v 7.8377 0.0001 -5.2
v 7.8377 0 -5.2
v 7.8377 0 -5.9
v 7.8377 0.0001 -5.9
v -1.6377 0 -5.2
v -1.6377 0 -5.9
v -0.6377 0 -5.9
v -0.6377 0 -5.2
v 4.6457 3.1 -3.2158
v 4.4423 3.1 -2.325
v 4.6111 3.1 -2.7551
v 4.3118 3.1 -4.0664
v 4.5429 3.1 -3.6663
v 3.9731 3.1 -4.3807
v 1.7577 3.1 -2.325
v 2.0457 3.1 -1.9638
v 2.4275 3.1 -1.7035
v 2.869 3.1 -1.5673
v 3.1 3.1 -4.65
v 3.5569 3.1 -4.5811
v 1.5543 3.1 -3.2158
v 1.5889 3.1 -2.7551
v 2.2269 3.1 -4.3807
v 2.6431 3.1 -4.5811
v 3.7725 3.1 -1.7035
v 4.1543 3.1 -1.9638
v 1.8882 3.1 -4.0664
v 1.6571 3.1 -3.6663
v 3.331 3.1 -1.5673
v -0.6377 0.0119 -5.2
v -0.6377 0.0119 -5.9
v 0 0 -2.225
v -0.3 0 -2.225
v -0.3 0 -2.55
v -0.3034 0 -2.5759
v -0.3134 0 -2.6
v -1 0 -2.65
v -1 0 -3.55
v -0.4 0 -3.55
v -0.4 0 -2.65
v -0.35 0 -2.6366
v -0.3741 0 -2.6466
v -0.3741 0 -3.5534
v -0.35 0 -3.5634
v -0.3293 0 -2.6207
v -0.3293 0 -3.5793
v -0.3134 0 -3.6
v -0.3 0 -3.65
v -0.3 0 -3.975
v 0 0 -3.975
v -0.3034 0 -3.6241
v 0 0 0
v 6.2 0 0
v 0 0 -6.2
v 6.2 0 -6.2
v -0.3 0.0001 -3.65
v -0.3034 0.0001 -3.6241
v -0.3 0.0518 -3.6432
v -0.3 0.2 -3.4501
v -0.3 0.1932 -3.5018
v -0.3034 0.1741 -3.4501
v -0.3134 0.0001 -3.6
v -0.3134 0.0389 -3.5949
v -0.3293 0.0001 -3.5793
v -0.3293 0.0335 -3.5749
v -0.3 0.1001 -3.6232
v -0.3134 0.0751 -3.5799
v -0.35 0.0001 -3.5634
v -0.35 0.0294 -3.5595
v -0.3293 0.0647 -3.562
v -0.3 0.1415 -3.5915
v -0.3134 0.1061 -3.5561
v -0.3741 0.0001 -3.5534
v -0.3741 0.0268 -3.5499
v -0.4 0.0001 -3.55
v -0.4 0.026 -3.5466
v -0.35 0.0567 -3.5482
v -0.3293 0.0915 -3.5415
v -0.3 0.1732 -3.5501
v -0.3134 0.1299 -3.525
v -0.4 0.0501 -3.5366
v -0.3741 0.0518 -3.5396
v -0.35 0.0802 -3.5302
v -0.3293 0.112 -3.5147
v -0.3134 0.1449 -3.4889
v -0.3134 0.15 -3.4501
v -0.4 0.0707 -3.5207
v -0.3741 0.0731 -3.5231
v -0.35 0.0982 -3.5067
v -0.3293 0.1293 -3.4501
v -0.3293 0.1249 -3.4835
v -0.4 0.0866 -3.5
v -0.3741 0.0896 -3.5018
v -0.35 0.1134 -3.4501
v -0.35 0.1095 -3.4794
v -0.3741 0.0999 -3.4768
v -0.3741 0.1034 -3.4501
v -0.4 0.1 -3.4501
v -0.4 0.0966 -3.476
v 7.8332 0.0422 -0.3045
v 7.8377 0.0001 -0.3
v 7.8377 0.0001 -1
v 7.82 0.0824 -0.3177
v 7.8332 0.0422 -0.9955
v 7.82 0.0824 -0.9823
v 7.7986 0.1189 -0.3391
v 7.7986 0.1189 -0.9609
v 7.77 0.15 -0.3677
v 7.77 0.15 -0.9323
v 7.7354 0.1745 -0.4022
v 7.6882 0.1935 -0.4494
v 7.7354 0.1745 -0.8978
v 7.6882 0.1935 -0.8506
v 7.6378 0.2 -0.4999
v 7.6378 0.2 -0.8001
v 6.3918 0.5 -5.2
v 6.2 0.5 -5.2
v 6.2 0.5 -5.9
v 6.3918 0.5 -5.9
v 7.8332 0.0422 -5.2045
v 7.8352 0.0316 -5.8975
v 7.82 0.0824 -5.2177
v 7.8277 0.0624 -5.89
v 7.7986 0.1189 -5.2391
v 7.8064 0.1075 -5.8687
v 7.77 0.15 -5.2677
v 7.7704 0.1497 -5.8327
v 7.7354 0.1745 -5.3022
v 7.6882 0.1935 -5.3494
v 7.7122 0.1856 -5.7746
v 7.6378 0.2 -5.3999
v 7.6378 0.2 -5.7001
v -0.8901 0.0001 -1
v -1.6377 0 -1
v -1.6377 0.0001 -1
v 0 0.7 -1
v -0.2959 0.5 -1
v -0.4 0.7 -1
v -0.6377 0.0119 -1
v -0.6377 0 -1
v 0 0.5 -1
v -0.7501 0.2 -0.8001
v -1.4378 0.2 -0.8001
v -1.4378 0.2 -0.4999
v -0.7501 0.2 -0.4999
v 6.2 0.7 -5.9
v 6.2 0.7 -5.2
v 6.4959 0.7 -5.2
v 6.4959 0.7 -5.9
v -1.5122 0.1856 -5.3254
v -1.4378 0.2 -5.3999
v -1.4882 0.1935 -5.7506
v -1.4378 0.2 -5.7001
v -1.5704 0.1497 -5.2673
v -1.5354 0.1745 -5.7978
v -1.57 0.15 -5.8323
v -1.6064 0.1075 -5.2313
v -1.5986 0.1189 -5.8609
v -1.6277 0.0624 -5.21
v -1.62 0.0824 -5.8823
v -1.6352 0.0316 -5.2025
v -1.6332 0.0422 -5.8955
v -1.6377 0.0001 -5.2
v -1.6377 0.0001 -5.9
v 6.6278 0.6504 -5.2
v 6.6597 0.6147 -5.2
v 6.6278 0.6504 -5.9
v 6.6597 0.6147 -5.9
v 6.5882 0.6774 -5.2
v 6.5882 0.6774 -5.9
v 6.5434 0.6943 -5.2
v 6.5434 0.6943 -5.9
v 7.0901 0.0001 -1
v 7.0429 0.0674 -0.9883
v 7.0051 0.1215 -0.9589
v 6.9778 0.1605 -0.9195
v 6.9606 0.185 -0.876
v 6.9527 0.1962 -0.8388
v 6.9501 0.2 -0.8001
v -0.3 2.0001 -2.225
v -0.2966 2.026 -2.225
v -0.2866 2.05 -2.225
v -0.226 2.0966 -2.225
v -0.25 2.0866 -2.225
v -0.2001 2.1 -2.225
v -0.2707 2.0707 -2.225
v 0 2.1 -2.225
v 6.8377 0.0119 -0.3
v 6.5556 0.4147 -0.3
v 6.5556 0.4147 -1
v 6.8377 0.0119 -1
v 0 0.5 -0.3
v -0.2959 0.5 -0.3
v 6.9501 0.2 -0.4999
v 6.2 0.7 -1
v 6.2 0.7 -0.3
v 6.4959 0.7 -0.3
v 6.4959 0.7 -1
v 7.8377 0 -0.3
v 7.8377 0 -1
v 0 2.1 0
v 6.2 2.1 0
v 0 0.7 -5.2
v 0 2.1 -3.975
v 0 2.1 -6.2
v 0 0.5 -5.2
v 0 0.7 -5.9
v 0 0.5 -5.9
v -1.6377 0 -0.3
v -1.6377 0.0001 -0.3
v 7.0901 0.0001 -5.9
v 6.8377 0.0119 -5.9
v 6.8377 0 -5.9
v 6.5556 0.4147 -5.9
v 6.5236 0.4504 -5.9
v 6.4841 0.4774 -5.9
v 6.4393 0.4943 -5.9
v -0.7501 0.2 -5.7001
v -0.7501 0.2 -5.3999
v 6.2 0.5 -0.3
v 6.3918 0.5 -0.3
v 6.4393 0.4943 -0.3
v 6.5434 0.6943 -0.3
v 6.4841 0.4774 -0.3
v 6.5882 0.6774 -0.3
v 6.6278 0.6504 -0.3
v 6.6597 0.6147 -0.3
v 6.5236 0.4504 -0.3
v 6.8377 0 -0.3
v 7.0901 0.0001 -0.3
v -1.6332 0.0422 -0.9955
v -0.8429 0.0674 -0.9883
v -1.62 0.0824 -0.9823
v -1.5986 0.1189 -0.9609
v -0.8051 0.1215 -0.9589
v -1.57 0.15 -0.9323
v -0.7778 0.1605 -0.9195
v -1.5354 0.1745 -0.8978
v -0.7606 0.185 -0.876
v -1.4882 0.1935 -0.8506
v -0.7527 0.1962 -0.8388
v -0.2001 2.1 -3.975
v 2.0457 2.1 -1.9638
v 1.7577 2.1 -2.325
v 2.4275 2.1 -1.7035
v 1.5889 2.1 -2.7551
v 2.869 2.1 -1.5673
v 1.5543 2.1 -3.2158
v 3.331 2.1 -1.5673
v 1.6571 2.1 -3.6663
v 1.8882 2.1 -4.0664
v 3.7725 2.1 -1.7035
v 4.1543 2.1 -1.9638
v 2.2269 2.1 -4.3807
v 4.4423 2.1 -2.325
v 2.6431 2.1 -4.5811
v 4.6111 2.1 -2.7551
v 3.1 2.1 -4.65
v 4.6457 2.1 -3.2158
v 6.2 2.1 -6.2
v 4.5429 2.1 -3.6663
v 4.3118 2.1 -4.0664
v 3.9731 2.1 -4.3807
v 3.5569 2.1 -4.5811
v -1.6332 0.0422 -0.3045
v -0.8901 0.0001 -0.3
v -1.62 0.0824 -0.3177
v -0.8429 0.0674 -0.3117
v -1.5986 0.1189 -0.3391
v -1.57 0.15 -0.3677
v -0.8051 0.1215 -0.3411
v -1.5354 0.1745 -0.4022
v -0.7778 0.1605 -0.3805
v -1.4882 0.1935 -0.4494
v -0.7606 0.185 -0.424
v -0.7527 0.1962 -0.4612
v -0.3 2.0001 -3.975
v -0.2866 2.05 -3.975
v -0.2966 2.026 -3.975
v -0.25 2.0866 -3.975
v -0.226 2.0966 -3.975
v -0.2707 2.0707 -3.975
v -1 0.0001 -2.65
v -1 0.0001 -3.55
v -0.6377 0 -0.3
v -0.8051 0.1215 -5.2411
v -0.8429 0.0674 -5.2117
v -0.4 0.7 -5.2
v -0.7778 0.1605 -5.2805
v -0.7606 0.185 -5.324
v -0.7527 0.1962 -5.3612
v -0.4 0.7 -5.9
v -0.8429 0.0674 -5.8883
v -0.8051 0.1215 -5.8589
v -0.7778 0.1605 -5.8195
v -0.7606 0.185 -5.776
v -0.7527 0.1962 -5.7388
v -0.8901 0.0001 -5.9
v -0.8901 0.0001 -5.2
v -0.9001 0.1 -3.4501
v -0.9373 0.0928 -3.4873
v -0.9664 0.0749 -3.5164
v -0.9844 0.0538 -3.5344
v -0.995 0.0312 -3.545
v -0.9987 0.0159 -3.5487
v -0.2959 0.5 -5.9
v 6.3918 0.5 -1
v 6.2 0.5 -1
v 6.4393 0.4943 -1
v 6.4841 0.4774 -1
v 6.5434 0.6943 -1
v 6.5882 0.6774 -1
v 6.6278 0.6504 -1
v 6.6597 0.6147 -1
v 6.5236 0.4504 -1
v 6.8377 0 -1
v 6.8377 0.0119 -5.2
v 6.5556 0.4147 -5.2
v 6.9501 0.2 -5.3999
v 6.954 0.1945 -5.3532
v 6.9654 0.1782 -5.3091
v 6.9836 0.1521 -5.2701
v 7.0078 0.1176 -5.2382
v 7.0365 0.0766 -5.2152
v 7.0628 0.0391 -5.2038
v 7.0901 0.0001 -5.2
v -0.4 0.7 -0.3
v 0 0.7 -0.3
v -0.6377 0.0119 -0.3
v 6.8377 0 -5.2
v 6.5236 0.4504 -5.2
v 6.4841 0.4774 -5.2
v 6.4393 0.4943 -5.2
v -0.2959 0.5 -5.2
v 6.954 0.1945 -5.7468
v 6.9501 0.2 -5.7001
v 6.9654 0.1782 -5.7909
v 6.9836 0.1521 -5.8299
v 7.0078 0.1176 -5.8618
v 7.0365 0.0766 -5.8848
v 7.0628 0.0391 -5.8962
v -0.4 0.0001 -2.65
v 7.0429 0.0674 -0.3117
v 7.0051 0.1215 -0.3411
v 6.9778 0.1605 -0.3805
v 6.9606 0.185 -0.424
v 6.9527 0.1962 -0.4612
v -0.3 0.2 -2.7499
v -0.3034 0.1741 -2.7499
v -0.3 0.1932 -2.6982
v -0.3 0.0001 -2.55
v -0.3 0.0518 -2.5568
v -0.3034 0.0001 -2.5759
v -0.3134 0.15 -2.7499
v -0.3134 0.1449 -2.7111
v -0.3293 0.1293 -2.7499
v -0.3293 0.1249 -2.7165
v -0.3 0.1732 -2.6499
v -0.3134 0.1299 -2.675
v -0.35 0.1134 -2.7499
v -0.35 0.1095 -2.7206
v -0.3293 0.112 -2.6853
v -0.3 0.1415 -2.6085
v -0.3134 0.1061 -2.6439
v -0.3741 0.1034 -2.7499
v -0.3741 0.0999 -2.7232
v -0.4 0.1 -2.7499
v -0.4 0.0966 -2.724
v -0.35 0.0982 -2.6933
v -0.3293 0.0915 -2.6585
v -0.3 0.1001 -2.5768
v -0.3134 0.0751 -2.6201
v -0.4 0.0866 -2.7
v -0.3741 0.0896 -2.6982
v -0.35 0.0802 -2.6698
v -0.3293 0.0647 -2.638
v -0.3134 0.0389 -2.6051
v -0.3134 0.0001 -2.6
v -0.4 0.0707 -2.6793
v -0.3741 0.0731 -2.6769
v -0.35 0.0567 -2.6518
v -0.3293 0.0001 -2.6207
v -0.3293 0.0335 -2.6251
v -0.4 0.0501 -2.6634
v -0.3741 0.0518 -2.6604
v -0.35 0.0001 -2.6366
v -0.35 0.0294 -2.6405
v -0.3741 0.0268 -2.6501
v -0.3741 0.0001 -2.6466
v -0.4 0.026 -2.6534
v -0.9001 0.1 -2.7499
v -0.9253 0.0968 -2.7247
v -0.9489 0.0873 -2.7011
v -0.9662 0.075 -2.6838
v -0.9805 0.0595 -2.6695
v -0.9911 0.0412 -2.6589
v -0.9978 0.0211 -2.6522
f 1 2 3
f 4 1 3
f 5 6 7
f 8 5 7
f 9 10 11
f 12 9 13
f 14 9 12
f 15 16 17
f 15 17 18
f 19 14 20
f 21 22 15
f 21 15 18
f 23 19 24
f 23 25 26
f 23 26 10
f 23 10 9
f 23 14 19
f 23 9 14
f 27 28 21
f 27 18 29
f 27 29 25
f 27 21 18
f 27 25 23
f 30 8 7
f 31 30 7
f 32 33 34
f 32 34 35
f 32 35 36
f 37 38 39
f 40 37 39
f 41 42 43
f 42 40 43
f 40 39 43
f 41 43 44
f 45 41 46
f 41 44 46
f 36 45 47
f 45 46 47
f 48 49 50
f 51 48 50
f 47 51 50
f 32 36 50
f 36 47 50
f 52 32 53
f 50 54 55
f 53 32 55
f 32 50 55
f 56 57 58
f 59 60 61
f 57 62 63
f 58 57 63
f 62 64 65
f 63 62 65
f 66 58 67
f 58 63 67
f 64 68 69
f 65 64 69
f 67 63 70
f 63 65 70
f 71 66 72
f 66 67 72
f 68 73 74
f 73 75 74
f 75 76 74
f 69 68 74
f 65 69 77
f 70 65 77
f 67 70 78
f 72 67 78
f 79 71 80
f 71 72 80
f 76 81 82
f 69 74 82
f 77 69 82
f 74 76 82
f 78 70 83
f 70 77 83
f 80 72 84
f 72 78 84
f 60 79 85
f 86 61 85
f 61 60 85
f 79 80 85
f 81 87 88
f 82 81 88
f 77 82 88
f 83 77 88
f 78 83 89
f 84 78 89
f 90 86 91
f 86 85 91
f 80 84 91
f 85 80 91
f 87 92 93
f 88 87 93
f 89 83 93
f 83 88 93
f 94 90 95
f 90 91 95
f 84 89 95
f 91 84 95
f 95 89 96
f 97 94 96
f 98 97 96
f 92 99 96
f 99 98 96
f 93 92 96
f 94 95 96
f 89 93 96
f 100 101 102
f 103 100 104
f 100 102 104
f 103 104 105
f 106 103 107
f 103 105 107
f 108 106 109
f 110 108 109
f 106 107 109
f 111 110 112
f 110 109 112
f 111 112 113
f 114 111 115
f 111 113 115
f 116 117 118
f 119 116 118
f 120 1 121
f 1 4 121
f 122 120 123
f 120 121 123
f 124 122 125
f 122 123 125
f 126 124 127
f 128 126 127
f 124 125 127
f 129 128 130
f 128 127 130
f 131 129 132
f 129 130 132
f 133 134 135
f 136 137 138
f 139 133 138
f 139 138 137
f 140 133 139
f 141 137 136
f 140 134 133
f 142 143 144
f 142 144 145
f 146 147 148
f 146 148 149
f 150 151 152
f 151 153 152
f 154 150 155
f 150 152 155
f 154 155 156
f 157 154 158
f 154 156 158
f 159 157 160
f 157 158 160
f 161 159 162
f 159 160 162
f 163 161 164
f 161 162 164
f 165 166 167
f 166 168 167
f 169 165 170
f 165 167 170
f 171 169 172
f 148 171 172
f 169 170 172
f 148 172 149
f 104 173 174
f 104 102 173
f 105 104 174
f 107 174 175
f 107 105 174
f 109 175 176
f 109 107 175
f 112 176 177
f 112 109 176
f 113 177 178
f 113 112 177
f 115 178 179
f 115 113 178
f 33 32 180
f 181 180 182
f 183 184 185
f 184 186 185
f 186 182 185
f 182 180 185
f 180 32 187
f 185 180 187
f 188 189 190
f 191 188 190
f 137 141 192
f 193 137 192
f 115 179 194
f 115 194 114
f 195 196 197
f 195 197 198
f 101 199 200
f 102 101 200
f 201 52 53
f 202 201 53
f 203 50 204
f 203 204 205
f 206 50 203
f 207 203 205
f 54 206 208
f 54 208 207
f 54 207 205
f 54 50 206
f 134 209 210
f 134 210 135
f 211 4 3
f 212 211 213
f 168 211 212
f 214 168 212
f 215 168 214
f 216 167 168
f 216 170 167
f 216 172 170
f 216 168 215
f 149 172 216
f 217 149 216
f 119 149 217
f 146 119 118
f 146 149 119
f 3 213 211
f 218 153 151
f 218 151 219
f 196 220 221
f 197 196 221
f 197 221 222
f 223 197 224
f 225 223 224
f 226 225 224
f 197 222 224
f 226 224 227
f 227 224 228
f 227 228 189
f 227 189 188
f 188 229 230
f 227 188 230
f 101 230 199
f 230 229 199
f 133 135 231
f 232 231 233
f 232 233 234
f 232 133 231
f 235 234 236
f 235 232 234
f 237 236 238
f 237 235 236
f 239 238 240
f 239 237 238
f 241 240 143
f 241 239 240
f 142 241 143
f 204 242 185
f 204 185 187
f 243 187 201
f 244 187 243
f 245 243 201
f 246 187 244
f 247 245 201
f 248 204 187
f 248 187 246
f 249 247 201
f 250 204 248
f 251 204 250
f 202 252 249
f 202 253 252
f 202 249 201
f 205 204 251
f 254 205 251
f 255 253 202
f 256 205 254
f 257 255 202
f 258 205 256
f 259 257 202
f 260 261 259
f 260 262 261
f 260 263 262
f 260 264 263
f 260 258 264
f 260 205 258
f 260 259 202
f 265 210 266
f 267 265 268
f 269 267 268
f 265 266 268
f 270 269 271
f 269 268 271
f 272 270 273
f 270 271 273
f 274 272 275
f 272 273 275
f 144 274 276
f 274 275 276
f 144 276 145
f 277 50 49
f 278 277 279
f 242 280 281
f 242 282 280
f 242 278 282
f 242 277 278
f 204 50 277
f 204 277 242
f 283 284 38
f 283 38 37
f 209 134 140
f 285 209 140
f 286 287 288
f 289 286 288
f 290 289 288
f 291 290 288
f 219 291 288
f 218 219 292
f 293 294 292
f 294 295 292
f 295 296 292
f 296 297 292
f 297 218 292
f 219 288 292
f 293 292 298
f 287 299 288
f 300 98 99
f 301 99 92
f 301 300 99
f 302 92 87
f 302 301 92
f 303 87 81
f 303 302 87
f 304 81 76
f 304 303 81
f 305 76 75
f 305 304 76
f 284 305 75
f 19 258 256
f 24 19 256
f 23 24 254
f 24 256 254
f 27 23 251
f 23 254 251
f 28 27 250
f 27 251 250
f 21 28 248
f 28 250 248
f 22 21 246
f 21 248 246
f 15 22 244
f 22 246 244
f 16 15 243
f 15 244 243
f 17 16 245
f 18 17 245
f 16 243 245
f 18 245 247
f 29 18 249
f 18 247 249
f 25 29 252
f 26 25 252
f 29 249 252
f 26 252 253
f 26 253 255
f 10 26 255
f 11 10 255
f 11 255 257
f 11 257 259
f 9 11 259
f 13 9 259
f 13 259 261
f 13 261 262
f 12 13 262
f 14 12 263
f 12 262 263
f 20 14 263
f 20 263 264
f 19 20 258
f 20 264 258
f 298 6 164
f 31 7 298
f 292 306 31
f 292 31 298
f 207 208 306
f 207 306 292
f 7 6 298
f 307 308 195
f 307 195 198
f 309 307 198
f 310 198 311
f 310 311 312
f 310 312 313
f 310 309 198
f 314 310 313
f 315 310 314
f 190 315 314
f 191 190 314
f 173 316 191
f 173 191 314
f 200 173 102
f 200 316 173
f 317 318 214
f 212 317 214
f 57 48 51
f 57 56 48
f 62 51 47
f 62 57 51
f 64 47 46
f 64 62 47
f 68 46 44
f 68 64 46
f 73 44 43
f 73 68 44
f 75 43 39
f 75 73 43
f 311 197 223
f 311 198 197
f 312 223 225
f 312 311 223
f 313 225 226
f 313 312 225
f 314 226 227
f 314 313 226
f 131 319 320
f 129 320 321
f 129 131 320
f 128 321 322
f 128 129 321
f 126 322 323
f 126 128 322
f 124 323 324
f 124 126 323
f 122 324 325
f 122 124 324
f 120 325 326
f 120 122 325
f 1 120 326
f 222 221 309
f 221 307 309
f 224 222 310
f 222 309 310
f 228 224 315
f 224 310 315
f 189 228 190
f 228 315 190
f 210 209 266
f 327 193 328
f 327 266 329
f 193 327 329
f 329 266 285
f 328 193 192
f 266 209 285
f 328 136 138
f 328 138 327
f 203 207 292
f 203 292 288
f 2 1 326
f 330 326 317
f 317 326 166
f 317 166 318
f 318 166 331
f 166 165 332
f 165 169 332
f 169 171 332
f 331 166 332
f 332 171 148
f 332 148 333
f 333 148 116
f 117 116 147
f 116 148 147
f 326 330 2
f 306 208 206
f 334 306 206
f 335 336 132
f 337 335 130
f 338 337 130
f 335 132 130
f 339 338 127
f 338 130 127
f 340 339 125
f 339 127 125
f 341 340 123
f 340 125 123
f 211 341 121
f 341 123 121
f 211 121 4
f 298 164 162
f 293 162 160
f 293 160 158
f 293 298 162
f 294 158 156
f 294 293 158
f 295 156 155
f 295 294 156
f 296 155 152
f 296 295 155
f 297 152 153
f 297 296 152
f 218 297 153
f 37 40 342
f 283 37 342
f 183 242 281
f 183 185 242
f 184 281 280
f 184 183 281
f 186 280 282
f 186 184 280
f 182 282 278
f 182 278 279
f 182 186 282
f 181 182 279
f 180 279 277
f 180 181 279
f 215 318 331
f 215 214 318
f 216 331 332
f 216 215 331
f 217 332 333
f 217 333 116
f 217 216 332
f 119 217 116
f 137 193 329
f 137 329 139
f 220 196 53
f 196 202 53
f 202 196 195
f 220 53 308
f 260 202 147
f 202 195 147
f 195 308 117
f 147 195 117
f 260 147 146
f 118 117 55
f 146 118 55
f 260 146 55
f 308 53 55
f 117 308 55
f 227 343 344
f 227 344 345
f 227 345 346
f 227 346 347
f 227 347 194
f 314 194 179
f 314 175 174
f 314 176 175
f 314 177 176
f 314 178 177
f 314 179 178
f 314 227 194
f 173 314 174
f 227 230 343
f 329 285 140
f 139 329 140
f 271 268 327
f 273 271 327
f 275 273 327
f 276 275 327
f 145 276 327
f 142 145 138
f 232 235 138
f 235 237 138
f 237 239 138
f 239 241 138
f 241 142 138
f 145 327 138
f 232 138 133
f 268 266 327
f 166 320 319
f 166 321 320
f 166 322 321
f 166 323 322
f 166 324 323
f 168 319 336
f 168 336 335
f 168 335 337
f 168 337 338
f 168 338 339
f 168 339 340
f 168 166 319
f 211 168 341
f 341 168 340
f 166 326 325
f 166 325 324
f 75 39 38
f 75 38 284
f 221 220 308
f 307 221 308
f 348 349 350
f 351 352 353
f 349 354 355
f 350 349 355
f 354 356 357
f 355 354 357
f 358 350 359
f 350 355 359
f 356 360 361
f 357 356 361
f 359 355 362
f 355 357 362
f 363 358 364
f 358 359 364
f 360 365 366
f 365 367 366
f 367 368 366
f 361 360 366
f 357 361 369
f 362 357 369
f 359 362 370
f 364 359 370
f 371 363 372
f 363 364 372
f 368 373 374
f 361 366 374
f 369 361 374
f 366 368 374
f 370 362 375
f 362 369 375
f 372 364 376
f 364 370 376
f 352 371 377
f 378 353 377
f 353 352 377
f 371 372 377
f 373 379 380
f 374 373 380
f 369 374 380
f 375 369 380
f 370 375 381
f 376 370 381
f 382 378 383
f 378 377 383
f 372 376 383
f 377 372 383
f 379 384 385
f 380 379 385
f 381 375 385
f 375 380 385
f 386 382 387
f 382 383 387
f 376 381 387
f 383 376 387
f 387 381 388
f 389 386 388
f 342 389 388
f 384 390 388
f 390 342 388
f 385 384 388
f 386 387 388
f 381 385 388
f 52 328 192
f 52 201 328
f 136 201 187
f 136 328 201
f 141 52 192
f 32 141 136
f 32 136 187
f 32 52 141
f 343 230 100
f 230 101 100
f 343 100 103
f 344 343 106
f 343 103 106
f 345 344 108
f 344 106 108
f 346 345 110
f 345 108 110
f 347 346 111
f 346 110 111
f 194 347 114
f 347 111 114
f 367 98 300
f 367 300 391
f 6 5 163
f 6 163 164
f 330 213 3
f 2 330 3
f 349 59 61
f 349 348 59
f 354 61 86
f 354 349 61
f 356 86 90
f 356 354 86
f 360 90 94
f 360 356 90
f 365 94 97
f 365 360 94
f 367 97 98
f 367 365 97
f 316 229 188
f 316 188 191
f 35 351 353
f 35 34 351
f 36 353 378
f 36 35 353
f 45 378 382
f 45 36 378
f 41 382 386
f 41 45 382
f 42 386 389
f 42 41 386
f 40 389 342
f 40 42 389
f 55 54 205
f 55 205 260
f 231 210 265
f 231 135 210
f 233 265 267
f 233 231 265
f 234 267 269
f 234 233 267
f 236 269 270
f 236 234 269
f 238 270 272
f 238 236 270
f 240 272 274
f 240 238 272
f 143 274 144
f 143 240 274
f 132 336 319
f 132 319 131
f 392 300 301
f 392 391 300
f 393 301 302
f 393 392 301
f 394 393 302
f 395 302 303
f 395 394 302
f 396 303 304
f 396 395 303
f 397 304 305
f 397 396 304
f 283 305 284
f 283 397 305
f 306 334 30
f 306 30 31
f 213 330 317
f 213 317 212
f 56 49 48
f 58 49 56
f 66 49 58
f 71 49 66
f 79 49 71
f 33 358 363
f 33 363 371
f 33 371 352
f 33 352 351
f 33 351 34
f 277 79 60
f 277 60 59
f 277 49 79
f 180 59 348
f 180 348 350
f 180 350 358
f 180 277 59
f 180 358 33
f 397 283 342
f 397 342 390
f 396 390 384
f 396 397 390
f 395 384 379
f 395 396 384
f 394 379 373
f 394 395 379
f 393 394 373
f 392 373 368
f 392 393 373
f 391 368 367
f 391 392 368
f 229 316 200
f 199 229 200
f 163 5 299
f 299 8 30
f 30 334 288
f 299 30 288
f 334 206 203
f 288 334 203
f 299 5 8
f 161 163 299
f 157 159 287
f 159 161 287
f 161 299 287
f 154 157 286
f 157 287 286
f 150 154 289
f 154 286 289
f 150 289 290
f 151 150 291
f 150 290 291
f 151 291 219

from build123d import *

# Parameters (mm, degrees)
ESQUISSE1_W         = 6.2
ESQUISSE1_H         = 6.2
BOSS_EXTRU_1_DEPTH  = 2.1
ESQUISSE2_R         = 1.55
BOSS_EXTRU_2_DEPTH  = 1
ESQUISSE3_W         = 1.75
ESQUISSE3_H         = 2.1
BOSS_EXTRU_3_DEPTH  = 0.3
ESQUISSE4_W         = 0.9
ESQUISSE4_H         = 0.1
BOSS_EXTRU_4_DEPTH  = 0.7
CONG_1_R            = 0.1
ESQUISSE5_W         = 0.7
ESQUISSE5_H         = 0.2
BOSS_EXTRU_5_DEPTH  = 0.4
ESQUISSE7_W         = 0.7
ESQUISSE7_H         = 0.2
BOSS_EXTRU_6_DEPTH  = 0.7
CONG_2_R            = 0.2
ESQUISSE9_W         = 1
ESQUISSE9_H         = 0.7
BOSS_EXTRU_7_DEPTH  = 0.2
CONG_3_R            = 0.2
CONG_4_R            = 0.2
ESQUISSE10_W        = 0.7
ESQUISSE10_H        = 0.2
BOSS_EXTRU_10_DEPTH = 0.4
ESQUISSE14_W        = 0.7
ESQUISSE14_H        = 0.2
BOSS_EXTRU_11_DEPTH = 0.7
ESQUISSE16_W        = 1
ESQUISSE16_H        = 0.7
BOSS_EXTRU_12_DEPTH = 0.2
CONG_5_R            = 0.2


with BuildPart() as part:
    # Esquisse1 → Boss.-Extru.1 (new body)
    with BuildSketch(Plane(origin=(0, 0, 0), x_dir=(1, 0, 0), z_dir=(0, 1, 0))):
        with Locations((3.1, 3.1)):
            Rectangle(ESQUISSE1_W, ESQUISSE1_H)
    extrude(amount=BOSS_EXTRU_1_DEPTH)

    # Esquisse2 → Boss.-Extru.2 (add)
    with BuildSketch(Plane(origin=(0, 2.1, 0), x_dir=(1, 0, 0), z_dir=(0, 1, 0))):
        with Locations(Location((3.1, 3.1, 0), (0, 0, 90))):
            Circle(ESQUISSE2_R)
    extrude(amount=BOSS_EXTRU_2_DEPTH)

    # Esquisse3 → Boss.-Extru.3 (add)
    with BuildSketch(Plane.ZY):
        with Locations((-3.1, 1.05)):
            Rectangle(ESQUISSE3_W, ESQUISSE3_H)
    extrude(amount=BOSS_EXTRU_3_DEPTH)

    # Esquisse4 → Boss.-Extru.4 (add)
    with BuildSketch(Plane.ZY.offset(0.3)):
        with Locations((-3.1, 0.05)):
            Rectangle(ESQUISSE4_W, ESQUISSE4_H)
    extrude(amount=BOSS_EXTRU_4_DEPTH)

    # Congé1
    cong_1_edges = [part.edges().sort_by_distance(p)[0] for p in [
        (-0.65, 0.1, -3.55),
        (-0.65, 0.1, -2.65),
        (-1, 0.1, -3.1),
        (-0.3, 2.1, -3.1),
    ]]
    fillet(cong_1_edges, radius=CONG_1_R - 0.0001)  # a hair under: the kernel refuses the full size
    cong_1_2_edges = [part.edges().sort_by_distance(p)[0] for p in [
        (-0.3, 0.1, -3.1),
        (-0.3, 0.070739967, -3.520739967),
        (-0.3, 0.070739967, -2.679260033),
    ]]
    fillet(cong_1_2_edges, radius=CONG_1_R)

    # Esquisse5 → Boss.-Extru.5 (add)
    with BuildSketch(Plane(origin=(6.2, 0, 0), x_dir=(0, 0, -1), z_dir=(1, 0, 0))):
        with Locations((0.65, 0.6)):
            Rectangle(ESQUISSE5_W, ESQUISSE5_H)
        with Locations((5.55, 0.6)):
            Rectangle(ESQUISSE5_W, ESQUISSE5_H)
    extrude(amount=BOSS_EXTRU_5_DEPTH)

    # Esquisse7 → Boss.-Extru.6 (add)
    with BuildSketch(Plane(origin=(1.84244111, -2.631278598, 0), x_dir=(0, 0, -1), z_dir=(-0.5735764363510502, 0.8191520442889889, 0))):
        with Locations((5.55, -5.707906998)):
            Rectangle(ESQUISSE7_W, ESQUISSE7_H)
        with Locations((0.65, -5.707906998)):
            Rectangle(ESQUISSE7_W, ESQUISSE7_H)
    extrude(amount=-BOSS_EXTRU_6_DEPTH)

    # Congé2
    cong_2_edges = [part.edges().sort_by_distance(p)[0] for p in [
        (6.49588659, 0.5, -5.55),
        (6.49588659, 0.5, -0.65),
        (6.6, 0.7, -0.65),
        (6.6, 0.7, -5.55),
    ]]
    fillet(cong_2_edges, radius=CONG_2_R)

    # Esquisse9 → Boss.-Extru.7 (add)
    with BuildSketch(Plane(origin=(0, 0, 0), x_dir=(1, 0, 0), z_dir=(0, 1, 0))):
        with Locations((7.337673097, 0.65)):
            Rectangle(ESQUISSE9_W, ESQUISSE9_H)
        with Locations((7.337673097, 5.55)):
            Rectangle(ESQUISSE9_W, ESQUISSE9_H)
    extrude(amount=BOSS_EXTRU_7_DEPTH)

    # Congé3
    cong_3_edges = [part.edges().sort_by_distance(p)[0] for p in [
        (7.837673097, 0.2, -0.65),
        (7.393888433, 0.2, -1),
        (7.393888433, 0.2, -0.3),
    ]]
    fillet(cong_3_edges, radius=CONG_3_R - 0.0001)  # a hair under: the kernel refuses the full size

    # Congé4
    cong_4_edges = [part.edges().sort_by_distance(p)[0] for p in [
        (7.393888433, 0.2, -5.9),
        (7.837673097, 0.2, -5.55),
        (7.393888433, 0.2, -5.2),
    ]]
    fillet(cong_4_edges, radius=CONG_4_R - 0.0001)  # a hair under: the kernel refuses the full size

    # Esquisse10 → Boss.-Extru.10 (add)
    with BuildSketch(Plane.ZY):
        with Locations((-5.55, 0.6)):
            Rectangle(ESQUISSE10_W, ESQUISSE10_H)
        with Locations((-0.65, 0.6)):
            Rectangle(ESQUISSE10_W, ESQUISSE10_H)
    extrude(amount=BOSS_EXTRU_10_DEPTH)

    # Esquisse14 → Boss.-Extru.11 (add)
    with BuildSketch(Plane(origin=(0.197296446, 0.281768526, 0), x_dir=(0, 0, -1), z_dir=(-0.5735764363510527, -0.8191520442889871, 0))):
        with Locations((0.65, -0.629164323)):
            Rectangle(ESQUISSE14_W, ESQUISSE14_H)
        with Locations((5.55, -0.629164323)):
            Rectangle(ESQUISSE14_W, ESQUISSE14_H)
    extrude(amount=BOSS_EXTRU_11_DEPTH)

    # Esquisse16 → Boss.-Extru.12 (add)
    with BuildSketch(Plane(origin=(0, 0, 0), x_dir=(1, 0, 0), z_dir=(0, 1, 0))):
        with Locations((-1.137673097, 0.65)):
            Rectangle(ESQUISSE16_W, ESQUISSE16_H)
        with Locations((-1.137673097, 5.55)):
            Rectangle(ESQUISSE16_W, ESQUISSE16_H)
    extrude(amount=BOSS_EXTRU_12_DEPTH)

    # Congé5
    cong_5_edges = [part.edges().sort_by_distance(p)[0] for p in [
        (-1.193888433, 0.2, -5.9),
        (-1.637673097, 0.2, -5.55),
        (-1.193888433, 0.2, -5.2),
        (-1.193888433, 0.2, -1),
        (-1.637673097, 0.2, -0.65),
        (-1.193888433, 0.2, -0.3),
    ]]
    fillet(cong_5_edges, radius=CONG_5_R - 0.0001)  # a hair under: the kernel refuses the full size


solid = part.part
